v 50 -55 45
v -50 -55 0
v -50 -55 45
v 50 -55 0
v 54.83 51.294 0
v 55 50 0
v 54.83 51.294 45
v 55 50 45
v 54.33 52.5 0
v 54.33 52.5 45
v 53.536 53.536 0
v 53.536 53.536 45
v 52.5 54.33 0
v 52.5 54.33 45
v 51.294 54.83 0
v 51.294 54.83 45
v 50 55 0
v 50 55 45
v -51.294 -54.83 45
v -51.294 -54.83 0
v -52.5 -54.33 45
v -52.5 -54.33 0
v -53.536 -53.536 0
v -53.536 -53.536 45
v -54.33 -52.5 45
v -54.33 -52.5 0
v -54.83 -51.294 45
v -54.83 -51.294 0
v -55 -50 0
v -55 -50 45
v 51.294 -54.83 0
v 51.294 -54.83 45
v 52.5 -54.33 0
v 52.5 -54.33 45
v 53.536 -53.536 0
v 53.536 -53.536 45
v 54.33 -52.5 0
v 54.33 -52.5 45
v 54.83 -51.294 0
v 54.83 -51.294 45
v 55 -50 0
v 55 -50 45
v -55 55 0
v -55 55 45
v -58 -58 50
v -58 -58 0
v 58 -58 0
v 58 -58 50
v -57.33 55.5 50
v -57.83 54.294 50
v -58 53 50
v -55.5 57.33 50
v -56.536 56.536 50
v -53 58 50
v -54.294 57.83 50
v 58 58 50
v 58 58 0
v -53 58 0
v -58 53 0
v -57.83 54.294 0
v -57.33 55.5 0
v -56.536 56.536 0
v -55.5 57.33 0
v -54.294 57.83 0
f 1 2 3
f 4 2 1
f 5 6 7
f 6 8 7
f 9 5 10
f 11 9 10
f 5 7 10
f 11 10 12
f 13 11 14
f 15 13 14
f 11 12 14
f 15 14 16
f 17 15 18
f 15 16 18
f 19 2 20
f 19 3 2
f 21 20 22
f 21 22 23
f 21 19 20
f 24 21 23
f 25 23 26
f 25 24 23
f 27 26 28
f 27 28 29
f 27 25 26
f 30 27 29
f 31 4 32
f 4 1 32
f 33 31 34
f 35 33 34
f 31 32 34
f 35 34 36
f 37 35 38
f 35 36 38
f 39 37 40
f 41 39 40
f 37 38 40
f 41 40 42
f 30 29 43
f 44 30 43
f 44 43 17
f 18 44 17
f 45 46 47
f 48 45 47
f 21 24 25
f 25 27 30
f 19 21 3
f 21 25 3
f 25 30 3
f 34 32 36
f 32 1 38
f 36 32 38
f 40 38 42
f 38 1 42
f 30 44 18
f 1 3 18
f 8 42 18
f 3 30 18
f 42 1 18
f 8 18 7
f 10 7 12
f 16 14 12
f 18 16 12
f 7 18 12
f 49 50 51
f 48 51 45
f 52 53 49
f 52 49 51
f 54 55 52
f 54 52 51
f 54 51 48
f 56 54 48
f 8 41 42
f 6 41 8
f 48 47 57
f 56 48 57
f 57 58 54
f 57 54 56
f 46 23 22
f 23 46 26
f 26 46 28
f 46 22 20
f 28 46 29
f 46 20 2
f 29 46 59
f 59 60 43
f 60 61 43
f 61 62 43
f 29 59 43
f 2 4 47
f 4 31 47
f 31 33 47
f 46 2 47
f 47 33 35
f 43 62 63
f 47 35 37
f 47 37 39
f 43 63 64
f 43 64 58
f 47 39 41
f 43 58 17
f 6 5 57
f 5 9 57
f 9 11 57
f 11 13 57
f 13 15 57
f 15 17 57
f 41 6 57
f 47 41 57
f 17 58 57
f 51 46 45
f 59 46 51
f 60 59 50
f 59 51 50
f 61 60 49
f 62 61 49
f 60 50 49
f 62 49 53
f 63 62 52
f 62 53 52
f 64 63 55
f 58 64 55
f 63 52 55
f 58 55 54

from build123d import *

# Parameters (mm, degrees)
F0_W     = 116
F0_H     = 116
F1_DEPTH = 50
F2_W     = 110
F2_H     = 110
F3_DEPTH = 45
F4_R     = 5


with BuildPart() as f1:
    # F0 (on Top) → F1 (new body)
    with BuildSketch(Plane.XY):
        Rectangle(F0_W, F0_H)
    extrude(amount=F1_DEPTH)

    # F2 (on Top) → F3 (cut)
    with BuildSketch(Plane.XY):
        Rectangle(F2_W, F2_H)
    extrude(amount=F3_DEPTH, mode=Mode.SUBTRACT)

    # F4
    f4_edges = [f1.edges().sort_by_distance(p)[0] for p in [
        (-58, 58, 25),
        (55, 55, 22.5),
        (-55, -55, 22.5),
        (55, -55, 22.5),
    ]]
    fillet(f4_edges, radius=F4_R)


solid = f1.part
